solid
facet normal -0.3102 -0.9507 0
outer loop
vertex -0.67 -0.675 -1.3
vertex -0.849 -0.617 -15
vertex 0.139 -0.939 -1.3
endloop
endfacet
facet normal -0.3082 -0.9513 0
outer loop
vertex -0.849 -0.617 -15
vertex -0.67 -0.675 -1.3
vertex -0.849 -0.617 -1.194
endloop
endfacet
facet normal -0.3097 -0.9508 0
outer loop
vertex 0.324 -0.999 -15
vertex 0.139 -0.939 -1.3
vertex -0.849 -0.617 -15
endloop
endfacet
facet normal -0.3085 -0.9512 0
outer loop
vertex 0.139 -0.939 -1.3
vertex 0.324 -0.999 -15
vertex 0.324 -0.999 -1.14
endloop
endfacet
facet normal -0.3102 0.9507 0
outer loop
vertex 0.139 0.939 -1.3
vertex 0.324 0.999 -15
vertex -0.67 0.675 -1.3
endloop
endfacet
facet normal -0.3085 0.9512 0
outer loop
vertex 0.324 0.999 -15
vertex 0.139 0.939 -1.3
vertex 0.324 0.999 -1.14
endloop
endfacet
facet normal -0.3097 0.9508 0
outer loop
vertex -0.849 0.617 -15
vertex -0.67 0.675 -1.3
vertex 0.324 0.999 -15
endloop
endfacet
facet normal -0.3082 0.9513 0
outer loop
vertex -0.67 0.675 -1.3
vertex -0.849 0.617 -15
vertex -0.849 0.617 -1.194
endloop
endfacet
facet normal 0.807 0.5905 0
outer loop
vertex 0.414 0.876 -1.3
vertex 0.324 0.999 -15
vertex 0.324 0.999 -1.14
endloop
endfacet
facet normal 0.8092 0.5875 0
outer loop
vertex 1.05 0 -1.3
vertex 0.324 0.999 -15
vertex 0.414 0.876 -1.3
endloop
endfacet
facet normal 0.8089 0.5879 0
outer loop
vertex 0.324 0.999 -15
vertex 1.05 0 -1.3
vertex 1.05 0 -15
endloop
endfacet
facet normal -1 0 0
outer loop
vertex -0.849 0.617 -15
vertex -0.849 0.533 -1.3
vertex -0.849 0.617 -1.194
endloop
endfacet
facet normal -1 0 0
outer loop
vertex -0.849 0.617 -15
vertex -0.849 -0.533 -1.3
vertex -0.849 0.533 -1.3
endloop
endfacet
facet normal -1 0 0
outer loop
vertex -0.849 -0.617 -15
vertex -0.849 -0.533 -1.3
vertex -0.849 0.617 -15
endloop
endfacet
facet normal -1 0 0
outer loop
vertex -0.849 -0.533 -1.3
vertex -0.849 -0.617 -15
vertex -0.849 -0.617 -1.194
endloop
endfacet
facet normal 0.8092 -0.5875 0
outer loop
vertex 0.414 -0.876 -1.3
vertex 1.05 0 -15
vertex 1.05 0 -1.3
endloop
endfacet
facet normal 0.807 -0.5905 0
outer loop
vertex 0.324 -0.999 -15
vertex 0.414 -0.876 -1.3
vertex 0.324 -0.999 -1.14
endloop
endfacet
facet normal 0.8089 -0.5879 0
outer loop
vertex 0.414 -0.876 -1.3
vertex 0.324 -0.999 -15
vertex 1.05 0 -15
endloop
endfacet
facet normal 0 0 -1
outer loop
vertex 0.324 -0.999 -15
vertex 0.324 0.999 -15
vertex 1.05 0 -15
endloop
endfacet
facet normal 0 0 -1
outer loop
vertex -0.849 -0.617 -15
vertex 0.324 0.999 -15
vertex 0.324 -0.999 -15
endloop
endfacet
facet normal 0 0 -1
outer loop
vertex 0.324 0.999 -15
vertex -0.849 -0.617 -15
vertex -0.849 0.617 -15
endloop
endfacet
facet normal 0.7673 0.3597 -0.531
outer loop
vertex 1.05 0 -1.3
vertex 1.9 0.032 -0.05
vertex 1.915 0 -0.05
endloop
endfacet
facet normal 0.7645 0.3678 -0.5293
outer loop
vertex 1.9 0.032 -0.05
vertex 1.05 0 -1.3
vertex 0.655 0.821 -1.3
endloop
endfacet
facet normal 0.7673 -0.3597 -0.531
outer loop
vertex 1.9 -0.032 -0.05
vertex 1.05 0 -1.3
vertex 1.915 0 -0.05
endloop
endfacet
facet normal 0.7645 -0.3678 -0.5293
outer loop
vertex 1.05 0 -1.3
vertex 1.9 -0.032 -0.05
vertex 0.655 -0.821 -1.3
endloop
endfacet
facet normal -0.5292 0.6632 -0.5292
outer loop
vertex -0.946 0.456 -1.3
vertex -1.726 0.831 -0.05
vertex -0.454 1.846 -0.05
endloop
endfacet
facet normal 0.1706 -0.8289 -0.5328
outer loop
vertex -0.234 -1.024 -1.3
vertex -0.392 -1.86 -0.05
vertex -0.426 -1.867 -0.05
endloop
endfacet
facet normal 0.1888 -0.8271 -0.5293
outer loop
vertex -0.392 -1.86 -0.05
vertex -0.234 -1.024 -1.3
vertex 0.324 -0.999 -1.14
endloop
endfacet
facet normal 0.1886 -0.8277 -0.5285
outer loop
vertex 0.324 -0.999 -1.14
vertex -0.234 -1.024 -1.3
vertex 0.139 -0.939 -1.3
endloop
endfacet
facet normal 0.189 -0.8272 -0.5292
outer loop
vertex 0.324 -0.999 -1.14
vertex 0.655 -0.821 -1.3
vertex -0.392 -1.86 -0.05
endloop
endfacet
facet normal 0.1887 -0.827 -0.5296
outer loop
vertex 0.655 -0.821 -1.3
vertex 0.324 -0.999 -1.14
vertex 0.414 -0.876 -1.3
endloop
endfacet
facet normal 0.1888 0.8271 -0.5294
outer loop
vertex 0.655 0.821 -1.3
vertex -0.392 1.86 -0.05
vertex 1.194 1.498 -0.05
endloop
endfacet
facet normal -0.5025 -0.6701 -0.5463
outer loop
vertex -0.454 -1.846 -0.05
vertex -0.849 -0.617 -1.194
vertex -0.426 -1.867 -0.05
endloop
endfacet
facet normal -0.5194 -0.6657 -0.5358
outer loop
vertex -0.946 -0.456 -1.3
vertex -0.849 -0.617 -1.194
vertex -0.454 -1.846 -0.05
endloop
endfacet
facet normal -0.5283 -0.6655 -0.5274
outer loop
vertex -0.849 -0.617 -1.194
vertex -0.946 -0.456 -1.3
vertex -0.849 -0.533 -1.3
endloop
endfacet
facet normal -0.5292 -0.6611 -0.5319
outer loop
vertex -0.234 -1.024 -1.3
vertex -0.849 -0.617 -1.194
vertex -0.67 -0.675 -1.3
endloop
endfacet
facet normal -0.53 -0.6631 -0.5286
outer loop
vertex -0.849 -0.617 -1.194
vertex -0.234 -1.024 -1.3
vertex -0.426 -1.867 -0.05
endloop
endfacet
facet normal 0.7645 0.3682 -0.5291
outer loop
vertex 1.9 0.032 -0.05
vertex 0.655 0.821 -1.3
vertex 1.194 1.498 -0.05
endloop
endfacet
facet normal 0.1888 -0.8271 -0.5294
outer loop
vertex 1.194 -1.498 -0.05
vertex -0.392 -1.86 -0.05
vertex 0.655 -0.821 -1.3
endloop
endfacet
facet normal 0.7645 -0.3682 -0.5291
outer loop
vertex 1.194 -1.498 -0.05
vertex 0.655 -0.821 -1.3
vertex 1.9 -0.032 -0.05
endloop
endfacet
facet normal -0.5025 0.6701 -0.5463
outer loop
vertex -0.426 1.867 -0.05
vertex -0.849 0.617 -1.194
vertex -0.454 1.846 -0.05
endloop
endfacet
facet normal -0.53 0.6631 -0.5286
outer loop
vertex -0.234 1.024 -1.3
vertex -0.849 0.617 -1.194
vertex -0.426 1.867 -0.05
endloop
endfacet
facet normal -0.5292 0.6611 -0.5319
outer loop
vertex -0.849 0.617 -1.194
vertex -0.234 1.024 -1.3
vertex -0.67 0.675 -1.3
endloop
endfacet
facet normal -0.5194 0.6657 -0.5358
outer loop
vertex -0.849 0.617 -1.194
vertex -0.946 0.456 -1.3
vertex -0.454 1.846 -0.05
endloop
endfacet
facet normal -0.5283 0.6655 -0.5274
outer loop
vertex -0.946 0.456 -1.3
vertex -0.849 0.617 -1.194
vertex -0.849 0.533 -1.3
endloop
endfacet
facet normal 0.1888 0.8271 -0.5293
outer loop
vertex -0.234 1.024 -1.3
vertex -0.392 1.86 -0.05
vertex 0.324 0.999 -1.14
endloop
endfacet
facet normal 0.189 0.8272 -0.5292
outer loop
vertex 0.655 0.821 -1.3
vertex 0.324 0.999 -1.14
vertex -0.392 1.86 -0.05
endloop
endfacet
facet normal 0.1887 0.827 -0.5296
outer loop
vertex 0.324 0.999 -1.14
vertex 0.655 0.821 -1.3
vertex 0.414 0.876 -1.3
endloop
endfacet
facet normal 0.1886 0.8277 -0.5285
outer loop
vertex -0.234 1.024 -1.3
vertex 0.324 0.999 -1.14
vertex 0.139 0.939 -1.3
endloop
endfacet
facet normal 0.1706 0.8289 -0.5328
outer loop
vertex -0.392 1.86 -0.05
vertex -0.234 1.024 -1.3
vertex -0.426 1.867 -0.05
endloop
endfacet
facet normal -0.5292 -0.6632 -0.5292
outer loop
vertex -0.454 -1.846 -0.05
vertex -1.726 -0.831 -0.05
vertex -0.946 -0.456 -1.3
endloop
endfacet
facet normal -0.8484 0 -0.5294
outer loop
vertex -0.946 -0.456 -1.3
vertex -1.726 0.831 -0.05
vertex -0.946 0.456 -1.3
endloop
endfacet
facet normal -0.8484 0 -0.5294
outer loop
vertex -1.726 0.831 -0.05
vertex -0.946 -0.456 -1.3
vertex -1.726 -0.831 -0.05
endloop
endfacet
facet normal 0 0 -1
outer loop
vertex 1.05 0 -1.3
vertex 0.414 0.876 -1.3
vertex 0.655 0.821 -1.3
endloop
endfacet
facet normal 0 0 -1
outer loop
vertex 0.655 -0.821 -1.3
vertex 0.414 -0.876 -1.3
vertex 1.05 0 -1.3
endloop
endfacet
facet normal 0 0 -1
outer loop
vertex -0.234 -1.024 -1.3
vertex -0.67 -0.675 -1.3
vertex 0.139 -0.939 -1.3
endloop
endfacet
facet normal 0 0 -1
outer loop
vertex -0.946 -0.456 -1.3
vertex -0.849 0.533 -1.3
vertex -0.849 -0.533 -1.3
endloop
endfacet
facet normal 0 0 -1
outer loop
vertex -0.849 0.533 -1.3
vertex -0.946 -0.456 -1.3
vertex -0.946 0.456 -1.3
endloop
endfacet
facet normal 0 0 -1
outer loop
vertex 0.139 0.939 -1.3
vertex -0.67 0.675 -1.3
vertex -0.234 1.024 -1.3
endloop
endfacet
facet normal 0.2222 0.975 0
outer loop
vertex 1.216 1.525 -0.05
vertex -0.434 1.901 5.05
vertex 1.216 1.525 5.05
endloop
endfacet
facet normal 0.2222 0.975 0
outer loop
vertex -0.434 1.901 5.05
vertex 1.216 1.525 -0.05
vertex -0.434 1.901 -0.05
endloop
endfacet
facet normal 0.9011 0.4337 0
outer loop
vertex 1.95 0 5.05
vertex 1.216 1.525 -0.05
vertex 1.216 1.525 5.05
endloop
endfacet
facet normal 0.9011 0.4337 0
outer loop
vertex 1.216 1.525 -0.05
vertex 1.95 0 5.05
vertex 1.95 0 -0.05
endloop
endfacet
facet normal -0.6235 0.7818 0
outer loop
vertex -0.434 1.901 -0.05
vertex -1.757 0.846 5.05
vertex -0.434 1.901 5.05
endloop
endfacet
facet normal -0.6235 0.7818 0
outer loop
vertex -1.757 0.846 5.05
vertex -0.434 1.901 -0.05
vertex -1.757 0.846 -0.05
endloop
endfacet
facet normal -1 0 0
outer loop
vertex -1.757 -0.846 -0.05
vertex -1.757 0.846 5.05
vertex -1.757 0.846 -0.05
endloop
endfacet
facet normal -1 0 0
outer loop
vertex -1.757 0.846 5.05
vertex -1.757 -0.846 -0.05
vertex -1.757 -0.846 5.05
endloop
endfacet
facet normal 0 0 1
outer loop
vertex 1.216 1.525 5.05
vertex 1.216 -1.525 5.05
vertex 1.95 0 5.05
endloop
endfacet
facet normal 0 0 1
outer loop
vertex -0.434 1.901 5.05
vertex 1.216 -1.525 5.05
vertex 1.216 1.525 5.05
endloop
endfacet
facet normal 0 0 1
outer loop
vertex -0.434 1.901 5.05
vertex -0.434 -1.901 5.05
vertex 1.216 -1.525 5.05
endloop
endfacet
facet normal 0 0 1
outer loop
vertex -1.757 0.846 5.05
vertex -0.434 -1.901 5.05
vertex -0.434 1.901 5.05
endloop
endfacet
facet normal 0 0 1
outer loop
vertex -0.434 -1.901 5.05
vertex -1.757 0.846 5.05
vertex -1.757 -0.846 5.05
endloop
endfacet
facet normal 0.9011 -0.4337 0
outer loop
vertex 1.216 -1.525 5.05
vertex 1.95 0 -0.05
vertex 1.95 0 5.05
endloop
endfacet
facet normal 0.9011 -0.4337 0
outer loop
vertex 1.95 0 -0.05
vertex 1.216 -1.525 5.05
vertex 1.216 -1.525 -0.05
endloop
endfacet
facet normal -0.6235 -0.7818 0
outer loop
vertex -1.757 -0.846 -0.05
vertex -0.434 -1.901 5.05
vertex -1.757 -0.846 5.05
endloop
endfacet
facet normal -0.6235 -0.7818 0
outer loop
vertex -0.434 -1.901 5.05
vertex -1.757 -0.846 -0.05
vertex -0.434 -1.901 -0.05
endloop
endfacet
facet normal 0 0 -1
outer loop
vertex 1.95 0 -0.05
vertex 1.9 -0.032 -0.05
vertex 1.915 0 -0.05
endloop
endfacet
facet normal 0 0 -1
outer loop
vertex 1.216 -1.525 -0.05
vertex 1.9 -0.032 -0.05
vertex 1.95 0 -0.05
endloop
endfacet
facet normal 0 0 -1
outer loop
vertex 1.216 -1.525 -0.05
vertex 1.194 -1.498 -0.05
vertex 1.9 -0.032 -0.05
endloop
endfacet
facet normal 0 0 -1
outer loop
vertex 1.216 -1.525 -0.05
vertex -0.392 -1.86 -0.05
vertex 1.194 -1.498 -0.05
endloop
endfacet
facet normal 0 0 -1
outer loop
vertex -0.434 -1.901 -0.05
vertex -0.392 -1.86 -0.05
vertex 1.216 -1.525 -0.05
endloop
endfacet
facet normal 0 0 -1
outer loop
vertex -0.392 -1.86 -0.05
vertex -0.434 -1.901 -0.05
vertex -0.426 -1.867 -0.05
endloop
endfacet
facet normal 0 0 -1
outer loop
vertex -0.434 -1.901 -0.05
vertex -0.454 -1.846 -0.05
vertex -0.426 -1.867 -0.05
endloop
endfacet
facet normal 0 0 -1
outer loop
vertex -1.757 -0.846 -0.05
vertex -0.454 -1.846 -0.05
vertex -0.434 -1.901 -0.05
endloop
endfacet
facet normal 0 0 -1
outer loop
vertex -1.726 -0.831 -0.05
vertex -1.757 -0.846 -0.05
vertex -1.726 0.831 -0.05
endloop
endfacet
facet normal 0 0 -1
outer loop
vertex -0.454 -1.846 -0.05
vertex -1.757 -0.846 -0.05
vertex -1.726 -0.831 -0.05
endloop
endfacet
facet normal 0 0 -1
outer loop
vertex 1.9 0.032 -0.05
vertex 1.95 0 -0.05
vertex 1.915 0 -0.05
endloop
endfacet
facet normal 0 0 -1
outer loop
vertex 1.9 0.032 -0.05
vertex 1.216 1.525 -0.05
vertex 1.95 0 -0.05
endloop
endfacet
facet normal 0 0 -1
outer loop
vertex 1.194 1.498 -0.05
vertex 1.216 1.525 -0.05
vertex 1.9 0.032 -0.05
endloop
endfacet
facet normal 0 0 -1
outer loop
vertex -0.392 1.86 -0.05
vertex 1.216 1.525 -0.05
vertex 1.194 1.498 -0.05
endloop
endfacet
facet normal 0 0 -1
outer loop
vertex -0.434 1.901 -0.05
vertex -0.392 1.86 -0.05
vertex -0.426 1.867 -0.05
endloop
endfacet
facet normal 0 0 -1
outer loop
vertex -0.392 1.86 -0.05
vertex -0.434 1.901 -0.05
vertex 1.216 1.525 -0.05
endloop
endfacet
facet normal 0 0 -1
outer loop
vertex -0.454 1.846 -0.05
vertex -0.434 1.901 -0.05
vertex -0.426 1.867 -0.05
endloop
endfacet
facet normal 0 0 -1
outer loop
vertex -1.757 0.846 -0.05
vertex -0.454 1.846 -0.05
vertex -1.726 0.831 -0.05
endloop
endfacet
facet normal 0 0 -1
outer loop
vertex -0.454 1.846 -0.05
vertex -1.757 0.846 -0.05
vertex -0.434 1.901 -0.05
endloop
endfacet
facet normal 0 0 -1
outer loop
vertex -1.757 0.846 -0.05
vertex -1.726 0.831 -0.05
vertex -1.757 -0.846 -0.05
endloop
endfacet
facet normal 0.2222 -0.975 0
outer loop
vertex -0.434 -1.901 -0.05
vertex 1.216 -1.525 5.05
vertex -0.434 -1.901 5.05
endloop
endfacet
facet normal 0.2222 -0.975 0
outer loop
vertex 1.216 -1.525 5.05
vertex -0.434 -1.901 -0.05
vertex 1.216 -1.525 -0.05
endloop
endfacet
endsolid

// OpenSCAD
/** common modules used in the other part source files
*/

module tube(h, inner_r, outer_r) {
    difference() {
        cylinder(h=h, r=outer_r);
        translate([0,0,-iota/2])
            cylinder(h=h+iota, r=inner_r);
    }
}

din963 = [
//  size  P     DK    K     N    T min
    [2,   0.4,  3.8,  1.2,  0.5, 0.4],
    [2.5, 0.45, 4.7,  1.5,  0.6, 0.5],
    [3,   0.5,  5.6,  1.65, 0.8, 0.6],
    [3.5, 0.6,  6.5,  1.93, 0.8, 0.7],
    [4,   0.7,  7.5,  2.2,  1,   0.8],
    [5,   0.8,  9.2,  2.5,  1.2, 1],
    [6,   1,    11,   3,    1.6, 1.2],
    [8,   1.25, 14.5, 4,    2,   1.6],
    [10,  1.5,  18,   5,    2.5, 2],
    [12,  1.75, 22,   6,    3,   2.4]
];

/** Mounting hole for a countersunk screw.
    
    The origin of the screw hole is on top of the center of the head. 
    The screw length is along the negative z axis.
    If h > 0, there will be a channel above the head (e.g. for the screwdriver).

    The size is given in m (as number) for the M size and over all length in l.
    
    iota > 0 adds to the radius of the head and screw.
    */
module mounting_hole_countersunk(m=2, l=15, h=0, iota=0.1) {

    // get data for given size (m)
    result = search(m, din963);
    i = result[0];
   
    head_diameter = din963[i][2] + iota;
    head_length = din963[i][3] + iota;
    screw_diameter = m + iota; 
    
    union() {
    // screw body
    translate([0, 0, -l])
        cylinder(h=l, r=screw_diameter/2);
    
    // screw head
    translate([0,0,-head_length])
        cylinder(h=head_length, r2=head_diameter/2, r1=screw_diameter/2);
    
    // hole above head
    translate([0,0,-iota/2])
        cylinder(h=h+iota,r=head_diameter/2);
    }
}

module mounting_hole(m=2, l=15, h=0, iota=0.1) {

    // get data for given size (m)
    result = search(m, din963);
    i = result[0];
   
    head_diameter = din963[i][2] + iota;
    head_length = din963[i][3] + iota;
    screw_diameter = m + iota; 
    
    union() {
    // screw body
    translate([0, 0, -l])
        cylinder(h=l, r=screw_diameter/2);    
    }
}

mounting_hole_countersunk(h=5);
